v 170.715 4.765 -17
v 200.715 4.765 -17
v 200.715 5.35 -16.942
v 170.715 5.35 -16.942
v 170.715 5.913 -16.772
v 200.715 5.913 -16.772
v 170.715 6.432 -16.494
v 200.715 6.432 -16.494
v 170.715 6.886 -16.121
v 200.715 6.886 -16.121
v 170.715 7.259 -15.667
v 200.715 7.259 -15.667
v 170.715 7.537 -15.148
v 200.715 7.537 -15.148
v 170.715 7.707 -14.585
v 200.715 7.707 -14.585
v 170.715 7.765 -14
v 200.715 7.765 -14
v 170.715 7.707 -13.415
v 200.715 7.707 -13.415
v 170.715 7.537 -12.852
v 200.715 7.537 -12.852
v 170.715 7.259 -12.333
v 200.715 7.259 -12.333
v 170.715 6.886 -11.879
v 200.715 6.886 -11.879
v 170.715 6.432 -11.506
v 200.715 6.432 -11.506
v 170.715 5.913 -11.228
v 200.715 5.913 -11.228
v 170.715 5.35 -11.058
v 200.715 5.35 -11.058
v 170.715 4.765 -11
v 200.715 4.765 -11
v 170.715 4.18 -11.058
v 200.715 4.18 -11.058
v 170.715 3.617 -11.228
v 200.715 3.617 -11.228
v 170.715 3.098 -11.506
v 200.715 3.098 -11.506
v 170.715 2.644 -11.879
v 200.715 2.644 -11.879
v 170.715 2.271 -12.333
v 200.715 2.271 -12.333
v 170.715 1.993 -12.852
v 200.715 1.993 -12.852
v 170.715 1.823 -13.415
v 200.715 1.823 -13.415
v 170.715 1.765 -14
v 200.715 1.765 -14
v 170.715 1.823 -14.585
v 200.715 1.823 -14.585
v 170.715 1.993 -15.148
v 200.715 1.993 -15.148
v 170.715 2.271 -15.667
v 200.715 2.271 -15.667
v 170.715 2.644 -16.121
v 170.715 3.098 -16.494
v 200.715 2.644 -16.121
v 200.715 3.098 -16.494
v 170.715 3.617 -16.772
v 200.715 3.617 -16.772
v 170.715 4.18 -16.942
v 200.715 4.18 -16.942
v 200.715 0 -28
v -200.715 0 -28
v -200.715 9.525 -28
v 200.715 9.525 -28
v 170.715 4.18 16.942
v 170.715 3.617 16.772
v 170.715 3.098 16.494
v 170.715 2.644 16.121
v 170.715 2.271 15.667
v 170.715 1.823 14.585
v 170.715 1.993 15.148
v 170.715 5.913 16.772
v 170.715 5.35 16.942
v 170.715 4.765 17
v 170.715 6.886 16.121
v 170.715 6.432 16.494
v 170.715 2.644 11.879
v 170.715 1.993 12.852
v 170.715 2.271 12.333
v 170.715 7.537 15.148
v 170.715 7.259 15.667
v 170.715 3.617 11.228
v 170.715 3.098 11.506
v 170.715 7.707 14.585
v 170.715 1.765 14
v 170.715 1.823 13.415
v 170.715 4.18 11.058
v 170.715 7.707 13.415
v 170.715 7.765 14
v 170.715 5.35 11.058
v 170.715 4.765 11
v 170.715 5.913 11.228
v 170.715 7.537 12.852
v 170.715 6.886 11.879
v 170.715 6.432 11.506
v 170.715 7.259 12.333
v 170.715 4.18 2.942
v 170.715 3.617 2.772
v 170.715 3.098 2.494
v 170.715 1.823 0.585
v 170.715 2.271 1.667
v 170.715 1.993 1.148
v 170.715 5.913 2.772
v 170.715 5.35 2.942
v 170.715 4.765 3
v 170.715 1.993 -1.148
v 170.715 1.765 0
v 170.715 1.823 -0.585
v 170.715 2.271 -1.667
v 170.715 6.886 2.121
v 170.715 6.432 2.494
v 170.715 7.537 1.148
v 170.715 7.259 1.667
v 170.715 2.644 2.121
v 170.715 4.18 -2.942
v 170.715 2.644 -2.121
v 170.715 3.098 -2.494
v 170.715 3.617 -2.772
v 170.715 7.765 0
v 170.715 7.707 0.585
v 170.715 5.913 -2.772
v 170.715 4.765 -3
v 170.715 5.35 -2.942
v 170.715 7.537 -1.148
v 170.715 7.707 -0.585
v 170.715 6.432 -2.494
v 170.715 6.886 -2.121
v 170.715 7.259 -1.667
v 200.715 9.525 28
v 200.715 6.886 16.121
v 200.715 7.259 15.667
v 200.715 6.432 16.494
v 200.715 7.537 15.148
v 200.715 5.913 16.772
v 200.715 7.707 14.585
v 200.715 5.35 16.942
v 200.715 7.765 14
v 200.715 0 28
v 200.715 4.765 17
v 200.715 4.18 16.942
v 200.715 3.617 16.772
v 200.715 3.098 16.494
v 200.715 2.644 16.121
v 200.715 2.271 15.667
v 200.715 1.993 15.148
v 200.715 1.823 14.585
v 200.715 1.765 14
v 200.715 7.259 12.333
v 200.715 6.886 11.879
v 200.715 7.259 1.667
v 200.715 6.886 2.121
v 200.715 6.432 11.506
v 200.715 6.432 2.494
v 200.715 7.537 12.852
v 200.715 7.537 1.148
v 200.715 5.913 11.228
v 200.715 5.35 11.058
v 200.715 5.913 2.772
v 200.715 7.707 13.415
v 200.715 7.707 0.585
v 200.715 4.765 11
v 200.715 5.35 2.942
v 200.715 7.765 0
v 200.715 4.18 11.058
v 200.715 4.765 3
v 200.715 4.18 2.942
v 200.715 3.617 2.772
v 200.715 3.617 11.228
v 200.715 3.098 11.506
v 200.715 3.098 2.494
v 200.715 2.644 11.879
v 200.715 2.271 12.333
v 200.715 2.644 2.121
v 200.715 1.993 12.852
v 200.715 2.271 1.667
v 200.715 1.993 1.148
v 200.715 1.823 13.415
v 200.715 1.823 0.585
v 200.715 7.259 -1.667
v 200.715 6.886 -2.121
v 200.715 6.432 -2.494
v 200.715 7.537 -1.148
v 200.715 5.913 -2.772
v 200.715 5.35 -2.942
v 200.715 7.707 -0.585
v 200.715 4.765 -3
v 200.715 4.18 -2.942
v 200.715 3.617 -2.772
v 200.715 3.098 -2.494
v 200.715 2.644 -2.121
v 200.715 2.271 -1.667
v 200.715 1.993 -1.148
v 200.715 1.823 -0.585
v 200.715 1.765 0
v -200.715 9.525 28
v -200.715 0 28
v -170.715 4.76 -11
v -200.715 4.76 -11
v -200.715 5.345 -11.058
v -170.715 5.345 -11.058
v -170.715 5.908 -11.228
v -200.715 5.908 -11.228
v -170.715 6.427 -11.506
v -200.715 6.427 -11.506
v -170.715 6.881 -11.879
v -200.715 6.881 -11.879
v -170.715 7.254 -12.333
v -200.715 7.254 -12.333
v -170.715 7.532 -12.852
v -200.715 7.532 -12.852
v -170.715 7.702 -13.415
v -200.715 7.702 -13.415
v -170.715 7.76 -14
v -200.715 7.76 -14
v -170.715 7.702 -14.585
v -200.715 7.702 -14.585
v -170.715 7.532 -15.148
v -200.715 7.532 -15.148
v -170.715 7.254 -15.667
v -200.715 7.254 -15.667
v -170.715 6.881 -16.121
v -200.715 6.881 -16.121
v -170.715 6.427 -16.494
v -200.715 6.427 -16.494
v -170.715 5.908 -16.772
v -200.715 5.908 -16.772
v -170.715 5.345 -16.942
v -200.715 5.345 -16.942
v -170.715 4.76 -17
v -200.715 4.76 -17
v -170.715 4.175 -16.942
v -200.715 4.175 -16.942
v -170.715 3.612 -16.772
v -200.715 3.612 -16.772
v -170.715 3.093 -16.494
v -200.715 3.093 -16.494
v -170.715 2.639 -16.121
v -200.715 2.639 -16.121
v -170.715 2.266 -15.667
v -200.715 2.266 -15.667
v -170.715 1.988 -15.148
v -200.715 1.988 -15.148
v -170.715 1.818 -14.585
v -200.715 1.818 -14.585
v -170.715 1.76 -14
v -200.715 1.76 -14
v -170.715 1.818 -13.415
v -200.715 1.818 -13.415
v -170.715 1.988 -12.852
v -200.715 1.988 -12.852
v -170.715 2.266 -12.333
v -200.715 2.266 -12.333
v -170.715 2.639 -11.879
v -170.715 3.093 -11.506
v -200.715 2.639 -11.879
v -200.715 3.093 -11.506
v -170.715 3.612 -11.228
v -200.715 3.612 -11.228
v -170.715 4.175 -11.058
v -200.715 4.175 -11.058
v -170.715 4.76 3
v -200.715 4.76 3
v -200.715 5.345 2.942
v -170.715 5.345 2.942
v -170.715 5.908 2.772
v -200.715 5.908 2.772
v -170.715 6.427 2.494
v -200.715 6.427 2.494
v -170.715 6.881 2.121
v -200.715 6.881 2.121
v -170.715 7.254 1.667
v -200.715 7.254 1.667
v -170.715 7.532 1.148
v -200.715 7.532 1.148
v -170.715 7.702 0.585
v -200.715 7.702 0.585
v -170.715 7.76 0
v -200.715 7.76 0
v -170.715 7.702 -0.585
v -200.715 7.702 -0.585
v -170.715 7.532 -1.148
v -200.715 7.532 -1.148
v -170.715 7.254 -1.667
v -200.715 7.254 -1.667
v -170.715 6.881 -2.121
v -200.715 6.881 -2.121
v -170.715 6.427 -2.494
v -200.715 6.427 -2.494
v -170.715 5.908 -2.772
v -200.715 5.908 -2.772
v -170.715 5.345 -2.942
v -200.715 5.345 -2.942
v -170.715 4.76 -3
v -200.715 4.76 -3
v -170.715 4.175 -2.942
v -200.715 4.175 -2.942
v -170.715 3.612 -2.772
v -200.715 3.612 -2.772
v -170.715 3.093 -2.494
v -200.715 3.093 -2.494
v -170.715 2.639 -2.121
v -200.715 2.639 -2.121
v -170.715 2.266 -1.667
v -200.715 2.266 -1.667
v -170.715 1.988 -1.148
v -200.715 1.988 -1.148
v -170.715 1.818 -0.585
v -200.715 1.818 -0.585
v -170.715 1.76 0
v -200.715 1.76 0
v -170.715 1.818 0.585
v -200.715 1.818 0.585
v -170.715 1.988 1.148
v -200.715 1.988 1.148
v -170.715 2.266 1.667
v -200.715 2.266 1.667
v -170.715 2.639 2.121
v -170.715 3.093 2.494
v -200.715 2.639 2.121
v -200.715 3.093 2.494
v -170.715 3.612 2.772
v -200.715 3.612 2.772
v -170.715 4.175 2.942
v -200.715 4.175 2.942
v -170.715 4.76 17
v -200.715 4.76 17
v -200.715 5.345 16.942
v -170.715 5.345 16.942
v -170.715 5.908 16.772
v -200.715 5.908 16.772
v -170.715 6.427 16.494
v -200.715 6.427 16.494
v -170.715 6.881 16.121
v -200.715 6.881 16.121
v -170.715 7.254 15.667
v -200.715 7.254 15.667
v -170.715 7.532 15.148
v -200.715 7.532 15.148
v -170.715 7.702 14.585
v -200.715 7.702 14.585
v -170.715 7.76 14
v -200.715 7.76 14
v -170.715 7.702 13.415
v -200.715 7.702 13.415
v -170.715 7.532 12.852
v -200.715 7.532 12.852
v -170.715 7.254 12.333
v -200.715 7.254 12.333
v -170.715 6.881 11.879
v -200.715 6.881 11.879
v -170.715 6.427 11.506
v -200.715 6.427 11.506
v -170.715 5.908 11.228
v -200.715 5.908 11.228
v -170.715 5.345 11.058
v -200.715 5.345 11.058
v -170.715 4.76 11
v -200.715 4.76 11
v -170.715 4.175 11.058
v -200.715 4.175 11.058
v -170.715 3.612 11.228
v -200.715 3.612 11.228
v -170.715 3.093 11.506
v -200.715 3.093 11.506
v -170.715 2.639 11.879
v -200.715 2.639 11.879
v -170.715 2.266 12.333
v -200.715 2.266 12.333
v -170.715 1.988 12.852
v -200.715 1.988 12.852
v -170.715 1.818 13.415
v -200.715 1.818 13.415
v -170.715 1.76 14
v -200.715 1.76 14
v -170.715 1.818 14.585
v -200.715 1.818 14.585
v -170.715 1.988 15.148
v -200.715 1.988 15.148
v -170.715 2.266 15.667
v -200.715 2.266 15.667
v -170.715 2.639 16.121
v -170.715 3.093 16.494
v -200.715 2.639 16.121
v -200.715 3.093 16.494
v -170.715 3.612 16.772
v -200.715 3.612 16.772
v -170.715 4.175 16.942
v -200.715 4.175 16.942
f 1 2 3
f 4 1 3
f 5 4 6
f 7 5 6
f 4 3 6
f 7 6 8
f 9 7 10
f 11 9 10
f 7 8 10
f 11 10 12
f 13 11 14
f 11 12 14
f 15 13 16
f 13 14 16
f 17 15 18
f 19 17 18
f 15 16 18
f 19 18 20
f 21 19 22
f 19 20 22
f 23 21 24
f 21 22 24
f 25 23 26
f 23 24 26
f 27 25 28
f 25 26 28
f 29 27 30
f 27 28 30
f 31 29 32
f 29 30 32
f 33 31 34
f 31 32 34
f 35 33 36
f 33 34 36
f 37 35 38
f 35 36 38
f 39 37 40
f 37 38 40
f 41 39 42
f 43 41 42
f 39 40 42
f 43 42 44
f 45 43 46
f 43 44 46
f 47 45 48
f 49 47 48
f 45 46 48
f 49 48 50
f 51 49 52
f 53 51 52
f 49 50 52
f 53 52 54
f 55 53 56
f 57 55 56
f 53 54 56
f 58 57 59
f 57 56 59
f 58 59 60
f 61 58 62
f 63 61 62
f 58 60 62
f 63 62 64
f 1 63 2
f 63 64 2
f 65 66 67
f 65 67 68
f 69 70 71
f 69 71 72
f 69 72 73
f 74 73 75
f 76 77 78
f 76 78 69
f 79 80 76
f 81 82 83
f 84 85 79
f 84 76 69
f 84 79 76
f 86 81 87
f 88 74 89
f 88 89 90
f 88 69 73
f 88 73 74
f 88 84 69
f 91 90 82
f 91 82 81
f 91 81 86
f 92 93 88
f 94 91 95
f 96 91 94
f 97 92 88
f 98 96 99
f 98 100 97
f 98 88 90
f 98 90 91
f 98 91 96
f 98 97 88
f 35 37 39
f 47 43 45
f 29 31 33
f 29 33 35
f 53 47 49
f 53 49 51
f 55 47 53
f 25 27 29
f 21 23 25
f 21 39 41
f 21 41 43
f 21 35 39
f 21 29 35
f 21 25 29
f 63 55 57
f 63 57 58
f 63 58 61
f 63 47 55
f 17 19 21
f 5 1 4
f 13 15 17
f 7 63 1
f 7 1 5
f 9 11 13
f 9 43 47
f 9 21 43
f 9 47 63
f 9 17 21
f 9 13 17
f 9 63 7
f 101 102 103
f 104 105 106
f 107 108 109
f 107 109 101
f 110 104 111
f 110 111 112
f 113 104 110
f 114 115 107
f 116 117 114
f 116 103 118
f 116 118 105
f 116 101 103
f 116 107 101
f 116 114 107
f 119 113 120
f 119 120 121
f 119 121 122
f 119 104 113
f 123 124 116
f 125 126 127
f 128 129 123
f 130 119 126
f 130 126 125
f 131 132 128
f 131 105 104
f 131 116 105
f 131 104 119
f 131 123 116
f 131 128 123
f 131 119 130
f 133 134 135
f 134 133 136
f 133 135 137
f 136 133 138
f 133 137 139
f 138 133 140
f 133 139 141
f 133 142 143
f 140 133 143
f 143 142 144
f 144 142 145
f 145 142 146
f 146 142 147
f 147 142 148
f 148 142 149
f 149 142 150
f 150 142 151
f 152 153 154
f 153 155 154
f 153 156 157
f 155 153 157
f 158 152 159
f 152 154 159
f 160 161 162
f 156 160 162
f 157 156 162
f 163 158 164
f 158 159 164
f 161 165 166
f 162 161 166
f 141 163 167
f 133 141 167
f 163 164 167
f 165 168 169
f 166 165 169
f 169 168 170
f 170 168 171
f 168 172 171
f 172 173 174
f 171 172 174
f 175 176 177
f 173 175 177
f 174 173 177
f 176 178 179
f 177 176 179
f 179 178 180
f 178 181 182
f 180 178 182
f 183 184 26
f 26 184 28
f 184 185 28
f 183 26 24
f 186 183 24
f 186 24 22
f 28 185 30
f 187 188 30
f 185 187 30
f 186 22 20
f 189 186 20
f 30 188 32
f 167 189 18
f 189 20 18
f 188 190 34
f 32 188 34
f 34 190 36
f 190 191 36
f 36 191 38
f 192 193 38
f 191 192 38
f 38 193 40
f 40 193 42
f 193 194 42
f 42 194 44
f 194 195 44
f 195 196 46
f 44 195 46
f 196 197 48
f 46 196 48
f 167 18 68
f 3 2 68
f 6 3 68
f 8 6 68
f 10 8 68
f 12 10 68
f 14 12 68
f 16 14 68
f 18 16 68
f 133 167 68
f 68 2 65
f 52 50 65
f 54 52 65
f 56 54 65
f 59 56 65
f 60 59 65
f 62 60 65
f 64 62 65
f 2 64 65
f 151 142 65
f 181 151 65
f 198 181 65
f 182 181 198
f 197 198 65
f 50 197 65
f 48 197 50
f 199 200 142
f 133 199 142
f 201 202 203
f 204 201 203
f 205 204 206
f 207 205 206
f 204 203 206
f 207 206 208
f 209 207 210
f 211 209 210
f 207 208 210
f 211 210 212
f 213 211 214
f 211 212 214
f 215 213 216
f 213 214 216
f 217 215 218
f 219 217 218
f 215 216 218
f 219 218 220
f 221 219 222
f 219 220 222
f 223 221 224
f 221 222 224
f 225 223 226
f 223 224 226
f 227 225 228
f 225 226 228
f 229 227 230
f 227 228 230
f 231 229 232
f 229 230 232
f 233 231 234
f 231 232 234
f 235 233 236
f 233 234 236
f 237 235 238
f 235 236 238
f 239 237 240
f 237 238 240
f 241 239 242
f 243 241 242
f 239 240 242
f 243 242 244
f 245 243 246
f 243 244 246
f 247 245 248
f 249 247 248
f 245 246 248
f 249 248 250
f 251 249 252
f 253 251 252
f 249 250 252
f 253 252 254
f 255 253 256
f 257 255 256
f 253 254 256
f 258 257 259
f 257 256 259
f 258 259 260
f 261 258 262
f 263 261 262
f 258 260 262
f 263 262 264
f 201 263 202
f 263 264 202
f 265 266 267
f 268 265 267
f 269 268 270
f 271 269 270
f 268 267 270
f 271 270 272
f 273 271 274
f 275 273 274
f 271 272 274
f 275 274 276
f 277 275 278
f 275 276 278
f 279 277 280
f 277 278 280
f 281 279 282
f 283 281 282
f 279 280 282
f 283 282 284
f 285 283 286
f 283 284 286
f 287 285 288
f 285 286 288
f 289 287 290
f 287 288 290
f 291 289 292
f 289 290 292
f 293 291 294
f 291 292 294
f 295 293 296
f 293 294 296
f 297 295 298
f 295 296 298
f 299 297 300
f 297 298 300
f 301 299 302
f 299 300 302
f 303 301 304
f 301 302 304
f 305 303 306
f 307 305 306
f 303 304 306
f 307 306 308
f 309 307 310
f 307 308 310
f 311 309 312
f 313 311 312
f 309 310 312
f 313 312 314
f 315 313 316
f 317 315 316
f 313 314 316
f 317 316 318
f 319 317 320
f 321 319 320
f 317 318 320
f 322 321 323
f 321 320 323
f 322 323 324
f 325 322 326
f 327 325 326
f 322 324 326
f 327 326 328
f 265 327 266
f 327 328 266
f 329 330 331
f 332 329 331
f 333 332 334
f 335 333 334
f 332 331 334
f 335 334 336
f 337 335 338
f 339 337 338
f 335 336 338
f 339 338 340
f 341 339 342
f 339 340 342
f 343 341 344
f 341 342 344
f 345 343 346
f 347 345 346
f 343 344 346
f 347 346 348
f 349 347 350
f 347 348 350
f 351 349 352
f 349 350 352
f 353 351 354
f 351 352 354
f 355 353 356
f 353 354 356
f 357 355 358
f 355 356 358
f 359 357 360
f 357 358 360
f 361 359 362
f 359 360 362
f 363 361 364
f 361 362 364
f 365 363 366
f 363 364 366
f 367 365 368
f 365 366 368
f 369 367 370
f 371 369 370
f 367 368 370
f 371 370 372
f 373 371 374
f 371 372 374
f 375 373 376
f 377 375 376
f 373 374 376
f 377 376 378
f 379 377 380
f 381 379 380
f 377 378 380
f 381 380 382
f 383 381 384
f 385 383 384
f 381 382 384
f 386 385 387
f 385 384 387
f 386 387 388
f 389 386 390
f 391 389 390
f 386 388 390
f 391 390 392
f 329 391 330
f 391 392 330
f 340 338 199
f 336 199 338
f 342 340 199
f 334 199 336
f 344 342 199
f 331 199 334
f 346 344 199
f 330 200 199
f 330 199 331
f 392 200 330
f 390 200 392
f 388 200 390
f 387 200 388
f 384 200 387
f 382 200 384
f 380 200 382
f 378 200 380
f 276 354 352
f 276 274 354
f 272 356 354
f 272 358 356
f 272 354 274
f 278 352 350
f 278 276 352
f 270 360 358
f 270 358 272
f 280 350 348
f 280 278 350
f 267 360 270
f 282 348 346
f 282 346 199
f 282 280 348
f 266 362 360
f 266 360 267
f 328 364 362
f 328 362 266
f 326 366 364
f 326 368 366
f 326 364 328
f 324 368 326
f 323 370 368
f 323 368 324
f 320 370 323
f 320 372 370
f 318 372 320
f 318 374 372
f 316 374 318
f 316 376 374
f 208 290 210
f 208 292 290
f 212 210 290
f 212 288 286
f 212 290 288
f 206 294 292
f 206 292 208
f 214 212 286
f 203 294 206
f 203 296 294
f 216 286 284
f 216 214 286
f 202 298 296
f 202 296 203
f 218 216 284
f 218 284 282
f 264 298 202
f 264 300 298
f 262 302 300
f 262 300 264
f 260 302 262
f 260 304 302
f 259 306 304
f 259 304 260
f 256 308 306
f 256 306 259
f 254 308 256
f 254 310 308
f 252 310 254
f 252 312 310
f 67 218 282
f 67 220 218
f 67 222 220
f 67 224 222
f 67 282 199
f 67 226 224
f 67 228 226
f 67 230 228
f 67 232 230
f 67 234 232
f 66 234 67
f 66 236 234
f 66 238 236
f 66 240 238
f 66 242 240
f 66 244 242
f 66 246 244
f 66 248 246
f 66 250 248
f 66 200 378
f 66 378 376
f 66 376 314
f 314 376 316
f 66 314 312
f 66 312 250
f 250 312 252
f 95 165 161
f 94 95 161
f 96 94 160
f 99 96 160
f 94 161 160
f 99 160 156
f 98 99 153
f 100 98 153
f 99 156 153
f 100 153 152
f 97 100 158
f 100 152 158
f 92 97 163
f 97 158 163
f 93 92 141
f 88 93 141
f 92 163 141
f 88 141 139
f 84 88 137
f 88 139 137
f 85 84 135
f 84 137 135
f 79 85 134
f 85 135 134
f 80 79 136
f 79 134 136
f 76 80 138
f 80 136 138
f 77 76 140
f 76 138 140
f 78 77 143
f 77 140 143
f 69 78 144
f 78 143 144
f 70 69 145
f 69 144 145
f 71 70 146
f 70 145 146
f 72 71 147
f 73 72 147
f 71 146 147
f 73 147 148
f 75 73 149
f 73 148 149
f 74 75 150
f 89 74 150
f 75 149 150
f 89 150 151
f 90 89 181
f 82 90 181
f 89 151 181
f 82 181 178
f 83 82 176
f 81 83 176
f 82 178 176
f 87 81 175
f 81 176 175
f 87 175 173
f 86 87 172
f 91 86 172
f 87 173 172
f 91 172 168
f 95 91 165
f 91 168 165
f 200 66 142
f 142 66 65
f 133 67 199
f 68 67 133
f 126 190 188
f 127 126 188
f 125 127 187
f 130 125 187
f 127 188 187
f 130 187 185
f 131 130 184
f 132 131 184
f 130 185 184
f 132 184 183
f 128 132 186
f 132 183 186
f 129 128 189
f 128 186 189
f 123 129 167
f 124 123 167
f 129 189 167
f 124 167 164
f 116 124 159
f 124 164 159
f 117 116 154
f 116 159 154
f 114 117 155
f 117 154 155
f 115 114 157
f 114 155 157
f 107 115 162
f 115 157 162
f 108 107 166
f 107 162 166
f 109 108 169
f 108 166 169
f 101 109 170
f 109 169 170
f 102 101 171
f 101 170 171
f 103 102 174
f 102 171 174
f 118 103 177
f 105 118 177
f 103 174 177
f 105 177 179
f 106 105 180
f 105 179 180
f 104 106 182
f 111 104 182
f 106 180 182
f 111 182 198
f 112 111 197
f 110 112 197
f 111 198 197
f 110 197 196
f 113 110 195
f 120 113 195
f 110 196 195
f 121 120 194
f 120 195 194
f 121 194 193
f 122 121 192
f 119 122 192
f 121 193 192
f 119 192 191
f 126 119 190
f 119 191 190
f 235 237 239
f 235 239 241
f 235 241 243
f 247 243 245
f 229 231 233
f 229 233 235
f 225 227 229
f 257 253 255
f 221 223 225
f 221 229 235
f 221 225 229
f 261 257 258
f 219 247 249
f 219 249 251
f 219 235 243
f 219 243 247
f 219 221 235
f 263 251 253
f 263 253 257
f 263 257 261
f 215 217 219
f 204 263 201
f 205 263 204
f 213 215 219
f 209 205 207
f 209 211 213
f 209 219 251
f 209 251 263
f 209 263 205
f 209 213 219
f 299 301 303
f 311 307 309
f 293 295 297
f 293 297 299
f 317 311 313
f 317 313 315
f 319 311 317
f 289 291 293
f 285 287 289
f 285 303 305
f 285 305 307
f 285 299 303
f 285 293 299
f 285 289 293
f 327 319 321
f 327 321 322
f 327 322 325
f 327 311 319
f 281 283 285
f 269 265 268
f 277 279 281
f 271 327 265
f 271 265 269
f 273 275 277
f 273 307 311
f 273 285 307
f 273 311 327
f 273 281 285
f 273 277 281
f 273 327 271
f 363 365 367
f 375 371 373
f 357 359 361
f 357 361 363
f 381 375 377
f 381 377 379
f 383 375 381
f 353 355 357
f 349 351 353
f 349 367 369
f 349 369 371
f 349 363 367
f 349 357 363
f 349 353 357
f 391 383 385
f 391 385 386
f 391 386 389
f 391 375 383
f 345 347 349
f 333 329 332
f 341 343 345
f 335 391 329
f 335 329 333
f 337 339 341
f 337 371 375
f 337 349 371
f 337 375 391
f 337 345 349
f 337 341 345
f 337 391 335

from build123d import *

# Parameters (mm, degrees)
ESBO_O1_W                = 401.43
ESBO_O1_H                = 56
RESSALTO_EXTRUS_O1_DEPTH = 9.525
ESBO_O2_R                = 3
FUROS_IZQ_DEPTH          = 30
ESBO_O3_R                = 3
FUROS_DER_DEPTH          = 30


with BuildPart() as part:
    # Esboço1 → Ressalto-extrusão1 (new body)
    with BuildSketch(Plane(origin=(0, 0, 0), x_dir=(1, 0, 0), z_dir=(0, 1, 0))):
        Rectangle(ESBO_O1_W, ESBO_O1_H)
    extrude(amount=RESSALTO_EXTRUS_O1_DEPTH)

    # Esboço2 → Furos Izq (cut)
    with BuildSketch(Plane.ZY.offset(200.715)):
        with Locations((14, 4.76)):
            Circle(ESBO_O2_R)
        with Locations((0, 4.76)):
            Circle(ESBO_O2_R)
        with Locations((-14, 4.76)):
            Circle(ESBO_O2_R)
    extrude(amount=-FUROS_IZQ_DEPTH, mode=Mode.SUBTRACT)

    # Esboço3 → Furos Der (cut)
    with BuildSketch(Plane(origin=(200.715, 0, 0), x_dir=(0, 0, -1), z_dir=(1, 0, 0))):
        with Locations((14, 4.765)):
            Circle(ESBO_O3_R)
        with Locations((0, 4.765)):
            Circle(ESBO_O3_R)
        with Locations((-14, 4.765)):
            Circle(ESBO_O3_R)
    extrude(amount=-FUROS_DER_DEPTH, mode=Mode.SUBTRACT)


solid = part.part
